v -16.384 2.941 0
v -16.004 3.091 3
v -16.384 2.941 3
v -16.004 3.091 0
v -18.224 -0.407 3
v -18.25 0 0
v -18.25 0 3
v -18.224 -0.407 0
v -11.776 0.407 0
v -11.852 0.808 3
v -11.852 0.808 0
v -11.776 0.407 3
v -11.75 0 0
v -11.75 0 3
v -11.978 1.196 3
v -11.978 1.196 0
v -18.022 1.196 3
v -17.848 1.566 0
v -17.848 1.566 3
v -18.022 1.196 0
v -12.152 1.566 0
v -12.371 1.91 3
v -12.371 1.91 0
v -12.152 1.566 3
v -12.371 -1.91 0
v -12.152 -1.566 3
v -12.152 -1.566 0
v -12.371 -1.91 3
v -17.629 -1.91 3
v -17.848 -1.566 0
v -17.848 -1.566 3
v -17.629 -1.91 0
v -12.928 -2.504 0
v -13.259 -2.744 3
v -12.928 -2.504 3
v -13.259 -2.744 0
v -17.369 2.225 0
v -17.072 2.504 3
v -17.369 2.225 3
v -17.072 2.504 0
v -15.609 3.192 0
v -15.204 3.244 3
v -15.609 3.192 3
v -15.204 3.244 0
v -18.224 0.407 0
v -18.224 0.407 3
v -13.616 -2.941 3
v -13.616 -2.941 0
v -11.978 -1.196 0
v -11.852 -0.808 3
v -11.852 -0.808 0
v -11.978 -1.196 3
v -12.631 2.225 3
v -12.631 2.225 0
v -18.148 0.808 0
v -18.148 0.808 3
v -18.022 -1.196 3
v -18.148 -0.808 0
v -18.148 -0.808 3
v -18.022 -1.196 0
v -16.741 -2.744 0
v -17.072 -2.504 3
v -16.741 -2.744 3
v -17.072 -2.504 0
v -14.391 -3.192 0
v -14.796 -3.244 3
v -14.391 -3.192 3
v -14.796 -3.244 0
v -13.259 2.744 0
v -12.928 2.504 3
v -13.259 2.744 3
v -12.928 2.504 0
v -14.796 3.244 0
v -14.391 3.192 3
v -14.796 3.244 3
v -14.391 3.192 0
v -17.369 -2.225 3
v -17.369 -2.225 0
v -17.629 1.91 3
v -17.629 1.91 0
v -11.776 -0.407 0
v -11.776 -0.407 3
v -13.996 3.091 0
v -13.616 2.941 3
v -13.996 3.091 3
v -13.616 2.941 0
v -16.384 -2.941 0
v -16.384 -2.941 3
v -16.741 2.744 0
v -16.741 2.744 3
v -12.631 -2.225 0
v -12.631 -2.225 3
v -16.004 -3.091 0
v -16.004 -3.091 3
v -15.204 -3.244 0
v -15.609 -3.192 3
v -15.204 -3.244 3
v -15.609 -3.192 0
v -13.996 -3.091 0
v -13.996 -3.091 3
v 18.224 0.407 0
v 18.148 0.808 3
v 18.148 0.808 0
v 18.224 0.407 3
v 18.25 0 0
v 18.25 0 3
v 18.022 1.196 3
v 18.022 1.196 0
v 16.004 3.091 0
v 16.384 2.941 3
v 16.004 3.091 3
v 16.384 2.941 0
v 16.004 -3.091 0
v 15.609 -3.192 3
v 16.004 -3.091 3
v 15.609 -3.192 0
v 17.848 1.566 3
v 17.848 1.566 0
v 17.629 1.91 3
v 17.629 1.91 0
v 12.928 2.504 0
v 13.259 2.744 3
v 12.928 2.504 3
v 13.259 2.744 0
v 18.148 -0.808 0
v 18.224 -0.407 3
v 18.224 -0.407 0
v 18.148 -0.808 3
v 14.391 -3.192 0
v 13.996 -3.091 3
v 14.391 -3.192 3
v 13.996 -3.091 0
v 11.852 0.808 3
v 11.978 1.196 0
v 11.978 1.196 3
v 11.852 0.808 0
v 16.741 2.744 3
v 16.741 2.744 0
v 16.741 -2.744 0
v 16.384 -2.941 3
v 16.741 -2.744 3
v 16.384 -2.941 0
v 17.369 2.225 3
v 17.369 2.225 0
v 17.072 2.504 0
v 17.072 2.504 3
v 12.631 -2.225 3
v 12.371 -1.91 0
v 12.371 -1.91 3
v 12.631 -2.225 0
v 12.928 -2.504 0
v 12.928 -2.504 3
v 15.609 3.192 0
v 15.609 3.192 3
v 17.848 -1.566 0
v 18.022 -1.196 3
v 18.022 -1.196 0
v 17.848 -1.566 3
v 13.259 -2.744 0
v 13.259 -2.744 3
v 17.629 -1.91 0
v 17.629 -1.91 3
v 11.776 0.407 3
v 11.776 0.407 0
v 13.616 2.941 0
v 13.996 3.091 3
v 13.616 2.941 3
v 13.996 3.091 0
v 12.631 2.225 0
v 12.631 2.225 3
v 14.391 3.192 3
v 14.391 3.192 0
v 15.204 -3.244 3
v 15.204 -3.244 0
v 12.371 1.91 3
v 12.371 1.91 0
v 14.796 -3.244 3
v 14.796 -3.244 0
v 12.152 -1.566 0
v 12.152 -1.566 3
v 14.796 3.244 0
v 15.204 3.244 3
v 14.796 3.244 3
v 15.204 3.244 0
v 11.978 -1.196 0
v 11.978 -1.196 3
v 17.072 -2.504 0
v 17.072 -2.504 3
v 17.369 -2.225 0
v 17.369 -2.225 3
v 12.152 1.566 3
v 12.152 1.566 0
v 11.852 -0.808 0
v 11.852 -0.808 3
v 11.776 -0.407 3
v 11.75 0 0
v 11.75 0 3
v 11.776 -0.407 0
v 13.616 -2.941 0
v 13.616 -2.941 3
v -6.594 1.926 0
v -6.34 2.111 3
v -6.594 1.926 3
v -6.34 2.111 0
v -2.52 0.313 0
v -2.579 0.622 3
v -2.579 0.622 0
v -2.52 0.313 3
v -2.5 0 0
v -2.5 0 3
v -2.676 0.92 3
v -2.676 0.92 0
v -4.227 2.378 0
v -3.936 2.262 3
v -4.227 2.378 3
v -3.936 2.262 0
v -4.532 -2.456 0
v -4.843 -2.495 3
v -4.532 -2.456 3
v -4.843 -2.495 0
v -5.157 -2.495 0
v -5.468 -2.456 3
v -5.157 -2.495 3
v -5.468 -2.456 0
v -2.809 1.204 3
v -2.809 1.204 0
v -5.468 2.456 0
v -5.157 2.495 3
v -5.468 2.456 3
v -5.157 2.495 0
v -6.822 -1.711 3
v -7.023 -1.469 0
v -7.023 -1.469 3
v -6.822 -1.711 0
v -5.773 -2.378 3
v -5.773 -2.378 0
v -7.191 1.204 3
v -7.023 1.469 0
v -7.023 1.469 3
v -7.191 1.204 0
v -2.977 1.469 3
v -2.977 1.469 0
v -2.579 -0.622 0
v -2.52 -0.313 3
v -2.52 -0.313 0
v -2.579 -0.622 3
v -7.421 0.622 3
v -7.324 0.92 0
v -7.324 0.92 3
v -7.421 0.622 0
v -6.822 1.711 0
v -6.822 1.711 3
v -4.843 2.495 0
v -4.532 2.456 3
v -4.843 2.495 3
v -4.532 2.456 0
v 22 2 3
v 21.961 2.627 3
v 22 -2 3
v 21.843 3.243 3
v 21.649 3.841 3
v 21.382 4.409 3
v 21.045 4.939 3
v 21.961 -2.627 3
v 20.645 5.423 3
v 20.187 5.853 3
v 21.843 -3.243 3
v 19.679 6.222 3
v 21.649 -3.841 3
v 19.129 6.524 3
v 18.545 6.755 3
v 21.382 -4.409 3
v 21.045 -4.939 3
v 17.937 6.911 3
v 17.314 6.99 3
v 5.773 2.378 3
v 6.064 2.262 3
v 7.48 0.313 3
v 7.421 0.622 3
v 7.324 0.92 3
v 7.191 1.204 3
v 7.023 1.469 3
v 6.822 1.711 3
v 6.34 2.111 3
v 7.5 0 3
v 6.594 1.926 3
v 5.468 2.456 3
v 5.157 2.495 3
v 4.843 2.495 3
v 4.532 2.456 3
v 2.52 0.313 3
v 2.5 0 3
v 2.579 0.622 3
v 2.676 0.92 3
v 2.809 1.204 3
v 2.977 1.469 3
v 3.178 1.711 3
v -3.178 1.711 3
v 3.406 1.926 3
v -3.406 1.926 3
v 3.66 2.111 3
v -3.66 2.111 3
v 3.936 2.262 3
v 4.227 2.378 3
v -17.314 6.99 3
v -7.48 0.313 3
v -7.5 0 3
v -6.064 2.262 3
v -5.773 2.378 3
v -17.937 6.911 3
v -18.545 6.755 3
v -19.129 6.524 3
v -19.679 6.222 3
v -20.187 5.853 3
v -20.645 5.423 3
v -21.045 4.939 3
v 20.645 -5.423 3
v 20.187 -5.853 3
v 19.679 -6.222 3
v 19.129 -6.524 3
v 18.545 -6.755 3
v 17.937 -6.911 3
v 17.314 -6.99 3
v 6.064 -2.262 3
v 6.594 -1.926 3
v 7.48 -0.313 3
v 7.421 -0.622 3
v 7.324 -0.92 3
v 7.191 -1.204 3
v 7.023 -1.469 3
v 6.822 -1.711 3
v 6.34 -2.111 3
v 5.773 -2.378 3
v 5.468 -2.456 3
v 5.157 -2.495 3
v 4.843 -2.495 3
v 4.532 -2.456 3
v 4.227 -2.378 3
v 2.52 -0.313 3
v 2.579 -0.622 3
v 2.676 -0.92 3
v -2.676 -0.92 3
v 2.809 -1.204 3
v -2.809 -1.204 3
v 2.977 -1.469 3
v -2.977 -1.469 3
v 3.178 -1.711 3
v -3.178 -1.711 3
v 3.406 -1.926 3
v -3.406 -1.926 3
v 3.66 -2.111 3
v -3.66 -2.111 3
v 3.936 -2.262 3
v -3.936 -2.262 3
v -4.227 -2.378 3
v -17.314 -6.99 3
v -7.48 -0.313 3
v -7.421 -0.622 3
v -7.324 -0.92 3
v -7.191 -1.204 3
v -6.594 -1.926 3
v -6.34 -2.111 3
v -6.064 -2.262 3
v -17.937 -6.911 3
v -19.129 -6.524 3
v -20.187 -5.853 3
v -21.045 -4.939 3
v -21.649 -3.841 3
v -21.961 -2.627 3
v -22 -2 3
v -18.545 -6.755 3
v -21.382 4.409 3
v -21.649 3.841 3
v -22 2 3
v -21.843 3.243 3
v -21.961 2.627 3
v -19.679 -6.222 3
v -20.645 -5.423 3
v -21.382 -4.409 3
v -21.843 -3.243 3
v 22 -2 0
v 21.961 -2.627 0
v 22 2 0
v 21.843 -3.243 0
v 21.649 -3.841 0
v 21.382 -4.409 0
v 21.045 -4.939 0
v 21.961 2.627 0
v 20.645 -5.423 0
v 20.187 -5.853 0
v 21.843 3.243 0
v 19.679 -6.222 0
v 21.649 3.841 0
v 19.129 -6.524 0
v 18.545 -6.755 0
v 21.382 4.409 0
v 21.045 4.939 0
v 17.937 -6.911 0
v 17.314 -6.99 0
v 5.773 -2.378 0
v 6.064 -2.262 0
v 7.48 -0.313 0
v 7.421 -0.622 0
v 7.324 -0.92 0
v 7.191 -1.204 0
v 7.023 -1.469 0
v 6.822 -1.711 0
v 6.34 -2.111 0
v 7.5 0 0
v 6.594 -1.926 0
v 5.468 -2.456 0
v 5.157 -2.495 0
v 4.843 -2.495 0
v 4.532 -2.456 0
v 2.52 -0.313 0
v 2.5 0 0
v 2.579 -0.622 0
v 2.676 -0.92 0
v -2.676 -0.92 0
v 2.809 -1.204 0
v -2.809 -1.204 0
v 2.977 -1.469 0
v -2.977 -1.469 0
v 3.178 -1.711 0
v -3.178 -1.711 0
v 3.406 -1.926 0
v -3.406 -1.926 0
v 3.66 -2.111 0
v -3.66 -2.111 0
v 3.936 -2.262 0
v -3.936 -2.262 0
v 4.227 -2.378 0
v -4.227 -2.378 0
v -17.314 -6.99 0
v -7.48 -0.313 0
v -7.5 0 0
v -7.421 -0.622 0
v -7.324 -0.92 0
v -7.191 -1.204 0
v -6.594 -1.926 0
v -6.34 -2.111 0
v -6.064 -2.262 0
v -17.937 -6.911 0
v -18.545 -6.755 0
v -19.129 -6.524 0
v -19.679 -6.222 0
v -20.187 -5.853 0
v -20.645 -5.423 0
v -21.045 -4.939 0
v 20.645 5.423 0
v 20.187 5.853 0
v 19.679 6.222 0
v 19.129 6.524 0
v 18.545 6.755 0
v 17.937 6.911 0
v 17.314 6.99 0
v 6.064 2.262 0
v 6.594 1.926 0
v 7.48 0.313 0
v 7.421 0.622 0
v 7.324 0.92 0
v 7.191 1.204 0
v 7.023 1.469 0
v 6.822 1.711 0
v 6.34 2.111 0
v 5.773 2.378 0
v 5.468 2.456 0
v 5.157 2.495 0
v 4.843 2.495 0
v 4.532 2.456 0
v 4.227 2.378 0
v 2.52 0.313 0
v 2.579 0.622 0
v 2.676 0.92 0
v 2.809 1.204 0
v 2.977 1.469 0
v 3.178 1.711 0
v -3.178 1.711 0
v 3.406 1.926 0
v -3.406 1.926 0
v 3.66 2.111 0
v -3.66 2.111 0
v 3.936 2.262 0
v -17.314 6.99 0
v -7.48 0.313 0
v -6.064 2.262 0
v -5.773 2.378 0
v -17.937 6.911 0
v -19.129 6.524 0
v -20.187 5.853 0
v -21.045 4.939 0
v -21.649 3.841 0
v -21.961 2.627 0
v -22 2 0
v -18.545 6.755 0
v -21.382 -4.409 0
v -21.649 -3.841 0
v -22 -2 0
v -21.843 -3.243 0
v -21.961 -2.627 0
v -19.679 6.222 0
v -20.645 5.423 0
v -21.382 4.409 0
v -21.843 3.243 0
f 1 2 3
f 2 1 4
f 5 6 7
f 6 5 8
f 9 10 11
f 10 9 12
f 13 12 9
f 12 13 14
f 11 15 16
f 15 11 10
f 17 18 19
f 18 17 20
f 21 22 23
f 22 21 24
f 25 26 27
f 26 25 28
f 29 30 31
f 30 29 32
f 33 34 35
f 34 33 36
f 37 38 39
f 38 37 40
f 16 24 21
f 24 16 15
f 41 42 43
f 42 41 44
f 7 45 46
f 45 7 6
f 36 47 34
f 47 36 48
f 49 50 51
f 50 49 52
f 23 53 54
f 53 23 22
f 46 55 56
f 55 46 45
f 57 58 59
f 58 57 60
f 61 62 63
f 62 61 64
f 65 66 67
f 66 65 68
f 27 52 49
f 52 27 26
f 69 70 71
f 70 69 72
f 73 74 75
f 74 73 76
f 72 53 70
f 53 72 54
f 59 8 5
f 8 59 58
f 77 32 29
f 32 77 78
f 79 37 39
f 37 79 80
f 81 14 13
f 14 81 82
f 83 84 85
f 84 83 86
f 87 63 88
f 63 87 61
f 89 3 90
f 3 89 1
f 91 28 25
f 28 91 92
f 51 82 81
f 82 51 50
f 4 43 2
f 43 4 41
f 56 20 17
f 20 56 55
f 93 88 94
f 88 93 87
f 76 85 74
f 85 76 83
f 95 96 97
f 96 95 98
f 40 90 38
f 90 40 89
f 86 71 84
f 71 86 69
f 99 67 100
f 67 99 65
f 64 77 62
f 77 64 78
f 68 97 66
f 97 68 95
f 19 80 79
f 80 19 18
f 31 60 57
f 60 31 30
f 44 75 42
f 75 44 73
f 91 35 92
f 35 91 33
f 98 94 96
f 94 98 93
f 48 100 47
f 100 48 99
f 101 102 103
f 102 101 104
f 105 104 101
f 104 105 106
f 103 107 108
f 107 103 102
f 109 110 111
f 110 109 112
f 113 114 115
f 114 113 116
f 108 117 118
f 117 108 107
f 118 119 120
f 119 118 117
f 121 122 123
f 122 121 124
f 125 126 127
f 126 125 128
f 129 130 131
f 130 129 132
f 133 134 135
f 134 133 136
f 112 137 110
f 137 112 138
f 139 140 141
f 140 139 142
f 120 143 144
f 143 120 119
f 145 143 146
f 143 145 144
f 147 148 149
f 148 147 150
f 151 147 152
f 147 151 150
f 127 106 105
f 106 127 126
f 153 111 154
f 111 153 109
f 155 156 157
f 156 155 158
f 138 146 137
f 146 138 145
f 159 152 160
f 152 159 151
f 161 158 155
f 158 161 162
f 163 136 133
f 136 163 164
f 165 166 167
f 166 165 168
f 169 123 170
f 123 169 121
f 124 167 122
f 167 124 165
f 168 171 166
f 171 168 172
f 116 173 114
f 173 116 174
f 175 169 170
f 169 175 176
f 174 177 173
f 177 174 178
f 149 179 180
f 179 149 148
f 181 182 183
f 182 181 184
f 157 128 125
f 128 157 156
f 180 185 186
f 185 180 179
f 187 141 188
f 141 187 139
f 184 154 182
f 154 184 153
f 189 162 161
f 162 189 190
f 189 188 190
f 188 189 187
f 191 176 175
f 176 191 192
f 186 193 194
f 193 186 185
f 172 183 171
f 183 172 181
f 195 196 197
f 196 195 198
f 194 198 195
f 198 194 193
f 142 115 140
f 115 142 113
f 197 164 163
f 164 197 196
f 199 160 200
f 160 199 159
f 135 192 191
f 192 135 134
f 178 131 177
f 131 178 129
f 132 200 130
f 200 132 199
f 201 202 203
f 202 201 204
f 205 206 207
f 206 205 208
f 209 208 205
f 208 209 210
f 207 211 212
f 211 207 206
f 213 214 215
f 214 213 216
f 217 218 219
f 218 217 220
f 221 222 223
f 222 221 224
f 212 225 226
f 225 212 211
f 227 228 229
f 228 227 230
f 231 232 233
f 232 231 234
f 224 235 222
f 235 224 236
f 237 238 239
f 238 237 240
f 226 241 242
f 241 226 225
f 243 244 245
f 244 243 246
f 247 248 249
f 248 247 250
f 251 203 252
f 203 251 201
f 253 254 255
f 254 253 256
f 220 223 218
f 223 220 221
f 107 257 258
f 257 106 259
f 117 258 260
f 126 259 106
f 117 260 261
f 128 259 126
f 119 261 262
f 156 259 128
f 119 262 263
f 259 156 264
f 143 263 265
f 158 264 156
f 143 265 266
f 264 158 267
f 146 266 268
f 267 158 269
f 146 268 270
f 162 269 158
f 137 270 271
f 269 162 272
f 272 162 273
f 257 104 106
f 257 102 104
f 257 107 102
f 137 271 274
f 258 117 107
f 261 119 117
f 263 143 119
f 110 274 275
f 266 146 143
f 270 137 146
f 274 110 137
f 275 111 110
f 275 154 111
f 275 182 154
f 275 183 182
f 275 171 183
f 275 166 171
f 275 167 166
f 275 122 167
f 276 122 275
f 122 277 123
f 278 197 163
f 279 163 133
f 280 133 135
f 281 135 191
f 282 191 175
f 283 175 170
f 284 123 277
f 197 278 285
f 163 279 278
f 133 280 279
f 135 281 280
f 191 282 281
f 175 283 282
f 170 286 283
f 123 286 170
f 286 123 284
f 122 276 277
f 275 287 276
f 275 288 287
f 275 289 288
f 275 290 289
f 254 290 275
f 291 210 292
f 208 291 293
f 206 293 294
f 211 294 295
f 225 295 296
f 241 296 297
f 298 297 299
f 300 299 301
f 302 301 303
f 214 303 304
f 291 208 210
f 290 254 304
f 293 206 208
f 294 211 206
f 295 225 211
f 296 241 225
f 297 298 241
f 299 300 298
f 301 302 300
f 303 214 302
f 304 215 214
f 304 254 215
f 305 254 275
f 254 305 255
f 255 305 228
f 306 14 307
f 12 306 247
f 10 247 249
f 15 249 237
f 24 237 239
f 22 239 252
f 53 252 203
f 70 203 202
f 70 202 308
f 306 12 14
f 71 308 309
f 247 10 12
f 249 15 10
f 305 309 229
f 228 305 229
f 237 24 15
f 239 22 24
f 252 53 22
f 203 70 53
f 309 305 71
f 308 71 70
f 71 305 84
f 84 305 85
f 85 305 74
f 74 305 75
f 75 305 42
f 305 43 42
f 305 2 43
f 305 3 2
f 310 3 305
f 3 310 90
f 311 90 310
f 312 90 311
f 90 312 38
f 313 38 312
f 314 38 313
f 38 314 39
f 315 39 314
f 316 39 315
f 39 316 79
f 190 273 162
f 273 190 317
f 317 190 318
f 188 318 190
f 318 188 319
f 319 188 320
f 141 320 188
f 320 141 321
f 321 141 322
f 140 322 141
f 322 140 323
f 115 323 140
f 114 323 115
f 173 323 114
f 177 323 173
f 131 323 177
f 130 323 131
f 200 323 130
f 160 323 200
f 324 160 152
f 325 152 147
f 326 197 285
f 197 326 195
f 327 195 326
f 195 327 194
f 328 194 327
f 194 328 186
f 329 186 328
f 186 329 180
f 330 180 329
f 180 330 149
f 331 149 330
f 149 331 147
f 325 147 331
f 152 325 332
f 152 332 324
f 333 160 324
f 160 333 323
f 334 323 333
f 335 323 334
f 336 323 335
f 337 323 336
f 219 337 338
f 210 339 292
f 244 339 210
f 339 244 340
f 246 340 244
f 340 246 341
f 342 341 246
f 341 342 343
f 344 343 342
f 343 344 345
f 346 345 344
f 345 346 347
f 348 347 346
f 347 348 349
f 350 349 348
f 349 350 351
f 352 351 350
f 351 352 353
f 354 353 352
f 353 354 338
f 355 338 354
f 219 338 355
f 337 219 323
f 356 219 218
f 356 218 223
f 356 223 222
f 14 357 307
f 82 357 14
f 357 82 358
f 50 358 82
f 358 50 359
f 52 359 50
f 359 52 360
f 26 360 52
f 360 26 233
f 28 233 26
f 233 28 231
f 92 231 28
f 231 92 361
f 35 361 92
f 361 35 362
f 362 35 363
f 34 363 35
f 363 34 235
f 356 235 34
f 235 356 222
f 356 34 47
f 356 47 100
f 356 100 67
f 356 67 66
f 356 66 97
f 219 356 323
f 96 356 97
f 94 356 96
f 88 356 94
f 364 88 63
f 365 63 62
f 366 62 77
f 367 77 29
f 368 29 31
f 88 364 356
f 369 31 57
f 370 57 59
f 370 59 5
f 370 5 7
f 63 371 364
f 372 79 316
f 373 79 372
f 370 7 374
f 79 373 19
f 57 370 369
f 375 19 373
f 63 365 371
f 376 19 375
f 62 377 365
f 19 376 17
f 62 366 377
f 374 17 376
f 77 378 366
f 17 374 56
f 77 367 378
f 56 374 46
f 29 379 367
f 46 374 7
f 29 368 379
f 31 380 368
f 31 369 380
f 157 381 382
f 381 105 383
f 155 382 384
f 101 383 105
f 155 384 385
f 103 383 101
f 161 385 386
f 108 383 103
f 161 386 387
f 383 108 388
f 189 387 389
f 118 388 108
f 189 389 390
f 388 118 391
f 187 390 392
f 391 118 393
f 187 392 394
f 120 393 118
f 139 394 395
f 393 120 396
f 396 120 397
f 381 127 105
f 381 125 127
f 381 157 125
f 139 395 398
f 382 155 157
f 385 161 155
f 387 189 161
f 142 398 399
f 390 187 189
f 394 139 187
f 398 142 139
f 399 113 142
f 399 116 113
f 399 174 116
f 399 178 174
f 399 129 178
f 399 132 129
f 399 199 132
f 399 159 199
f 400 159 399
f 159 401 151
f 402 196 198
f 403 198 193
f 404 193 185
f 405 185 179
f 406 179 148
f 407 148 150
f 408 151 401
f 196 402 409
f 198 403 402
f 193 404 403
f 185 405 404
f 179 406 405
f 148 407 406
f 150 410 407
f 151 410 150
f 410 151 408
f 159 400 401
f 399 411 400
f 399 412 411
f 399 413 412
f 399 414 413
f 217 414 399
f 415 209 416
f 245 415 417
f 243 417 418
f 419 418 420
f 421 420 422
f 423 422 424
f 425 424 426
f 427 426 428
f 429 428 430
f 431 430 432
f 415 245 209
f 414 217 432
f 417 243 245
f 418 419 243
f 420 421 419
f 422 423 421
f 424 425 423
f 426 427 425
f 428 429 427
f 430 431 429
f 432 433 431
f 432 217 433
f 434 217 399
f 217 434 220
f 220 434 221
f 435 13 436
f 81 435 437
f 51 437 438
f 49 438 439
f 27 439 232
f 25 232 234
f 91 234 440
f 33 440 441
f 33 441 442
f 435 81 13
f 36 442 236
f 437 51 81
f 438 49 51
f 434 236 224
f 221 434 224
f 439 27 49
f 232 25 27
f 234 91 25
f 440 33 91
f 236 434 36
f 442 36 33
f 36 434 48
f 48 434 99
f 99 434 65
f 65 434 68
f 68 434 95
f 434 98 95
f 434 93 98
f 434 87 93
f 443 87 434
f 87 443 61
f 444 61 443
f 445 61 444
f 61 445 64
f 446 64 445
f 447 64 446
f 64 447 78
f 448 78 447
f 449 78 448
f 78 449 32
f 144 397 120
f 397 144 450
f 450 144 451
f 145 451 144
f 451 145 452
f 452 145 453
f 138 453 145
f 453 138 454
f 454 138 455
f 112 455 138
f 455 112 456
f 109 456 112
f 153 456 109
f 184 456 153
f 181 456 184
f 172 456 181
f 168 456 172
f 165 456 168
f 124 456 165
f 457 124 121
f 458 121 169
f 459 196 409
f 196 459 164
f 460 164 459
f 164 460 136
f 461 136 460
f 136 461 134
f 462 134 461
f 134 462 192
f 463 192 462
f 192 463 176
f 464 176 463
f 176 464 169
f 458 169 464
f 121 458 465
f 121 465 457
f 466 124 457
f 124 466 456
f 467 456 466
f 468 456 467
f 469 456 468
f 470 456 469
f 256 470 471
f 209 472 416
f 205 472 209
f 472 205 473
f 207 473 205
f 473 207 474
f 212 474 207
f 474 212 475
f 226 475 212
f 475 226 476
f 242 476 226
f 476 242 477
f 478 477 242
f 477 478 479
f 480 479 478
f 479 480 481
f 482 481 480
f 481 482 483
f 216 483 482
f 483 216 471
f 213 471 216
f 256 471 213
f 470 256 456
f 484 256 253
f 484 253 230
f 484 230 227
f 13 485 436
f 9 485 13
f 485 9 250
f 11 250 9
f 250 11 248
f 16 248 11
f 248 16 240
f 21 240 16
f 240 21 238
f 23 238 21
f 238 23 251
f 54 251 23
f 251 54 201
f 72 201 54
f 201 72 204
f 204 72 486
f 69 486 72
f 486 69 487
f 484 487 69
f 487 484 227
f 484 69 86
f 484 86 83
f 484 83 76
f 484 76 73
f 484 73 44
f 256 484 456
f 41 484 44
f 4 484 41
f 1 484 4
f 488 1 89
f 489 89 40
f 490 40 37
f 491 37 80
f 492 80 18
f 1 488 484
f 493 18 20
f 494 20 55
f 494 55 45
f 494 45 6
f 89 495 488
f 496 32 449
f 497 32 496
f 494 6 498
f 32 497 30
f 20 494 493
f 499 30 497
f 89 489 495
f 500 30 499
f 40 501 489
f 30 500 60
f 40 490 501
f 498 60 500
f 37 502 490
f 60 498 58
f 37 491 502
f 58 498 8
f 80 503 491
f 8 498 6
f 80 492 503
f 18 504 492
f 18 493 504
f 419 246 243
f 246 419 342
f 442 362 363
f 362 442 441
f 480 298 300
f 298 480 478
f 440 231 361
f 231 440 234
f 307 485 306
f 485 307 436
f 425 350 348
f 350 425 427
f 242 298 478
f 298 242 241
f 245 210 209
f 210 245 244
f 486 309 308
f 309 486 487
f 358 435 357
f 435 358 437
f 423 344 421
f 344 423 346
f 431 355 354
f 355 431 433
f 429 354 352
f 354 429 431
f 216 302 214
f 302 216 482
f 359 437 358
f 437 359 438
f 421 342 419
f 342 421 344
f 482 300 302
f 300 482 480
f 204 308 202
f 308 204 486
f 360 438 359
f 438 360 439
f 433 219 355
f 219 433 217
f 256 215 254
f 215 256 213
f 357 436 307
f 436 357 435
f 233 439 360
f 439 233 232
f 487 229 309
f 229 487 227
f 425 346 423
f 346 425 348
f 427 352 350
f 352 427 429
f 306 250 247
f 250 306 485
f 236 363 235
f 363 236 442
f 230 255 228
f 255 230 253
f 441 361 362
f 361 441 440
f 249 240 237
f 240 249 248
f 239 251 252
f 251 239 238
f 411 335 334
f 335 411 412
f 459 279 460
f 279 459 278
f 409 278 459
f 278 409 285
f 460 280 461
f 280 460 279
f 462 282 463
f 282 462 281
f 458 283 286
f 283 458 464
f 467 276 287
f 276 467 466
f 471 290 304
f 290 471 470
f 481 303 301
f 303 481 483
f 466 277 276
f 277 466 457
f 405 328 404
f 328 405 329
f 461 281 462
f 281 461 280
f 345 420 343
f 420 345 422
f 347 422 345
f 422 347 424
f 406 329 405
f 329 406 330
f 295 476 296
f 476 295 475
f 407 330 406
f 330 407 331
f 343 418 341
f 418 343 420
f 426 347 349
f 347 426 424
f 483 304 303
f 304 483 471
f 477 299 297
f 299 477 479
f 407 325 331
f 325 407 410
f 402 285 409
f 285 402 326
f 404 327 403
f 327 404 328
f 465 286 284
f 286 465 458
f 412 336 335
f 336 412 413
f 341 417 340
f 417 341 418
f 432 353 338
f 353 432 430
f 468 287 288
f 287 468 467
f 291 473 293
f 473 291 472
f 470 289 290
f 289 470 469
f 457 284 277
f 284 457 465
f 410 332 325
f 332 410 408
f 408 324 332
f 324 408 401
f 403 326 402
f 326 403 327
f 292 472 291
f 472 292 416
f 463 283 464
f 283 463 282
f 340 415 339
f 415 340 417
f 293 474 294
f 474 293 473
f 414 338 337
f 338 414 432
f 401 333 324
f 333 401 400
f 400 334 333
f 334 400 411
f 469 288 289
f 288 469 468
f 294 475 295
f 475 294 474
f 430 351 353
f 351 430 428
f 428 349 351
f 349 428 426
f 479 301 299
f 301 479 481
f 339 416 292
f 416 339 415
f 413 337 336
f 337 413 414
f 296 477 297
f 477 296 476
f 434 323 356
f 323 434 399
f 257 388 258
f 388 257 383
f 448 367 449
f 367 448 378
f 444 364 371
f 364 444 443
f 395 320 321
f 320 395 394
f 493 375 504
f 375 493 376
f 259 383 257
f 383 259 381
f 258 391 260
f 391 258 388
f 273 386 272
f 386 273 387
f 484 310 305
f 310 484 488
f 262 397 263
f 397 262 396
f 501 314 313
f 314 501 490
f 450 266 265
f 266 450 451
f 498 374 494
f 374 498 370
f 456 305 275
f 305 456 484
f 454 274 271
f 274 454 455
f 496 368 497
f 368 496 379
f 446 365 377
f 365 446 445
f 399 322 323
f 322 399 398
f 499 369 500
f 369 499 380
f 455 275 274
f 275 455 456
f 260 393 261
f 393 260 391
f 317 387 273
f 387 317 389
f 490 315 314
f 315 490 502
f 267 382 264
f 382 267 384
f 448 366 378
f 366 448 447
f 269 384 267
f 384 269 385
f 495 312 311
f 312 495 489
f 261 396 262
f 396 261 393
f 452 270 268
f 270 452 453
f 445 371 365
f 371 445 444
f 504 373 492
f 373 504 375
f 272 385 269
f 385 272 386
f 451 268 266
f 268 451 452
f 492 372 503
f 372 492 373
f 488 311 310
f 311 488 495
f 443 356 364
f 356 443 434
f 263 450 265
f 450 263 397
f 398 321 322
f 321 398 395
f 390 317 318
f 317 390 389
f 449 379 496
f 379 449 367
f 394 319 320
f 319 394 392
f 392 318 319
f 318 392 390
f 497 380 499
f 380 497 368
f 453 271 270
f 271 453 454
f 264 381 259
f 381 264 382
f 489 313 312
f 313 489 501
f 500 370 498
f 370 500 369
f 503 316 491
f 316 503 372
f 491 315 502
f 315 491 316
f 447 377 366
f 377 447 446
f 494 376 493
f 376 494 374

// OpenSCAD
$fn = 50;


difference() {
	union() {
		hull() {
			translate(v = [-17.0000000000, 2.0000000000, 0]) {
				cylinder(h = 3, r = 5);
			}
			translate(v = [17.0000000000, 2.0000000000, 0]) {
				cylinder(h = 3, r = 5);
			}
			translate(v = [-17.0000000000, -2.0000000000, 0]) {
				cylinder(h = 3, r = 5);
			}
			translate(v = [17.0000000000, -2.0000000000, 0]) {
				cylinder(h = 3, r = 5);
			}
		}
	}
	union() {
		#translate(v = [-15.0000000000, 0.0000000000, -100.0000000000]) {
			cylinder(h = 200, r = 3.2500000000);
		}
		#translate(v = [-15.0000000000, 0.0000000000, -100.0000000000]) {
			cylinder(h = 200, r = 3.2500000000);
		}
		#translate(v = [15.0000000000, 0.0000000000, -100.0000000000]) {
			cylinder(h = 200, r = 3.2500000000);
		}
		#translate(v = [15.0000000000, 0.0000000000, -100.0000000000]) {
			cylinder(h = 200, r = 3.2500000000);
		}
		#translate(v = [-15.0000000000, 0, 0]) {
			cylinder(h = 3, r = 2.5000000000);
		}
		#translate(v = [-5.0000000000, 0, 0]) {
			cylinder(h = 3, r = 2.5000000000);
		}
		#translate(v = [5.0000000000, 0, 0]) {
			cylinder(h = 3, r = 2.5000000000);
		}
		#translate(v = [15.0000000000, 0, 0]) {
			cylinder(h = 3, r = 2.5000000000);
		}
	}
}
